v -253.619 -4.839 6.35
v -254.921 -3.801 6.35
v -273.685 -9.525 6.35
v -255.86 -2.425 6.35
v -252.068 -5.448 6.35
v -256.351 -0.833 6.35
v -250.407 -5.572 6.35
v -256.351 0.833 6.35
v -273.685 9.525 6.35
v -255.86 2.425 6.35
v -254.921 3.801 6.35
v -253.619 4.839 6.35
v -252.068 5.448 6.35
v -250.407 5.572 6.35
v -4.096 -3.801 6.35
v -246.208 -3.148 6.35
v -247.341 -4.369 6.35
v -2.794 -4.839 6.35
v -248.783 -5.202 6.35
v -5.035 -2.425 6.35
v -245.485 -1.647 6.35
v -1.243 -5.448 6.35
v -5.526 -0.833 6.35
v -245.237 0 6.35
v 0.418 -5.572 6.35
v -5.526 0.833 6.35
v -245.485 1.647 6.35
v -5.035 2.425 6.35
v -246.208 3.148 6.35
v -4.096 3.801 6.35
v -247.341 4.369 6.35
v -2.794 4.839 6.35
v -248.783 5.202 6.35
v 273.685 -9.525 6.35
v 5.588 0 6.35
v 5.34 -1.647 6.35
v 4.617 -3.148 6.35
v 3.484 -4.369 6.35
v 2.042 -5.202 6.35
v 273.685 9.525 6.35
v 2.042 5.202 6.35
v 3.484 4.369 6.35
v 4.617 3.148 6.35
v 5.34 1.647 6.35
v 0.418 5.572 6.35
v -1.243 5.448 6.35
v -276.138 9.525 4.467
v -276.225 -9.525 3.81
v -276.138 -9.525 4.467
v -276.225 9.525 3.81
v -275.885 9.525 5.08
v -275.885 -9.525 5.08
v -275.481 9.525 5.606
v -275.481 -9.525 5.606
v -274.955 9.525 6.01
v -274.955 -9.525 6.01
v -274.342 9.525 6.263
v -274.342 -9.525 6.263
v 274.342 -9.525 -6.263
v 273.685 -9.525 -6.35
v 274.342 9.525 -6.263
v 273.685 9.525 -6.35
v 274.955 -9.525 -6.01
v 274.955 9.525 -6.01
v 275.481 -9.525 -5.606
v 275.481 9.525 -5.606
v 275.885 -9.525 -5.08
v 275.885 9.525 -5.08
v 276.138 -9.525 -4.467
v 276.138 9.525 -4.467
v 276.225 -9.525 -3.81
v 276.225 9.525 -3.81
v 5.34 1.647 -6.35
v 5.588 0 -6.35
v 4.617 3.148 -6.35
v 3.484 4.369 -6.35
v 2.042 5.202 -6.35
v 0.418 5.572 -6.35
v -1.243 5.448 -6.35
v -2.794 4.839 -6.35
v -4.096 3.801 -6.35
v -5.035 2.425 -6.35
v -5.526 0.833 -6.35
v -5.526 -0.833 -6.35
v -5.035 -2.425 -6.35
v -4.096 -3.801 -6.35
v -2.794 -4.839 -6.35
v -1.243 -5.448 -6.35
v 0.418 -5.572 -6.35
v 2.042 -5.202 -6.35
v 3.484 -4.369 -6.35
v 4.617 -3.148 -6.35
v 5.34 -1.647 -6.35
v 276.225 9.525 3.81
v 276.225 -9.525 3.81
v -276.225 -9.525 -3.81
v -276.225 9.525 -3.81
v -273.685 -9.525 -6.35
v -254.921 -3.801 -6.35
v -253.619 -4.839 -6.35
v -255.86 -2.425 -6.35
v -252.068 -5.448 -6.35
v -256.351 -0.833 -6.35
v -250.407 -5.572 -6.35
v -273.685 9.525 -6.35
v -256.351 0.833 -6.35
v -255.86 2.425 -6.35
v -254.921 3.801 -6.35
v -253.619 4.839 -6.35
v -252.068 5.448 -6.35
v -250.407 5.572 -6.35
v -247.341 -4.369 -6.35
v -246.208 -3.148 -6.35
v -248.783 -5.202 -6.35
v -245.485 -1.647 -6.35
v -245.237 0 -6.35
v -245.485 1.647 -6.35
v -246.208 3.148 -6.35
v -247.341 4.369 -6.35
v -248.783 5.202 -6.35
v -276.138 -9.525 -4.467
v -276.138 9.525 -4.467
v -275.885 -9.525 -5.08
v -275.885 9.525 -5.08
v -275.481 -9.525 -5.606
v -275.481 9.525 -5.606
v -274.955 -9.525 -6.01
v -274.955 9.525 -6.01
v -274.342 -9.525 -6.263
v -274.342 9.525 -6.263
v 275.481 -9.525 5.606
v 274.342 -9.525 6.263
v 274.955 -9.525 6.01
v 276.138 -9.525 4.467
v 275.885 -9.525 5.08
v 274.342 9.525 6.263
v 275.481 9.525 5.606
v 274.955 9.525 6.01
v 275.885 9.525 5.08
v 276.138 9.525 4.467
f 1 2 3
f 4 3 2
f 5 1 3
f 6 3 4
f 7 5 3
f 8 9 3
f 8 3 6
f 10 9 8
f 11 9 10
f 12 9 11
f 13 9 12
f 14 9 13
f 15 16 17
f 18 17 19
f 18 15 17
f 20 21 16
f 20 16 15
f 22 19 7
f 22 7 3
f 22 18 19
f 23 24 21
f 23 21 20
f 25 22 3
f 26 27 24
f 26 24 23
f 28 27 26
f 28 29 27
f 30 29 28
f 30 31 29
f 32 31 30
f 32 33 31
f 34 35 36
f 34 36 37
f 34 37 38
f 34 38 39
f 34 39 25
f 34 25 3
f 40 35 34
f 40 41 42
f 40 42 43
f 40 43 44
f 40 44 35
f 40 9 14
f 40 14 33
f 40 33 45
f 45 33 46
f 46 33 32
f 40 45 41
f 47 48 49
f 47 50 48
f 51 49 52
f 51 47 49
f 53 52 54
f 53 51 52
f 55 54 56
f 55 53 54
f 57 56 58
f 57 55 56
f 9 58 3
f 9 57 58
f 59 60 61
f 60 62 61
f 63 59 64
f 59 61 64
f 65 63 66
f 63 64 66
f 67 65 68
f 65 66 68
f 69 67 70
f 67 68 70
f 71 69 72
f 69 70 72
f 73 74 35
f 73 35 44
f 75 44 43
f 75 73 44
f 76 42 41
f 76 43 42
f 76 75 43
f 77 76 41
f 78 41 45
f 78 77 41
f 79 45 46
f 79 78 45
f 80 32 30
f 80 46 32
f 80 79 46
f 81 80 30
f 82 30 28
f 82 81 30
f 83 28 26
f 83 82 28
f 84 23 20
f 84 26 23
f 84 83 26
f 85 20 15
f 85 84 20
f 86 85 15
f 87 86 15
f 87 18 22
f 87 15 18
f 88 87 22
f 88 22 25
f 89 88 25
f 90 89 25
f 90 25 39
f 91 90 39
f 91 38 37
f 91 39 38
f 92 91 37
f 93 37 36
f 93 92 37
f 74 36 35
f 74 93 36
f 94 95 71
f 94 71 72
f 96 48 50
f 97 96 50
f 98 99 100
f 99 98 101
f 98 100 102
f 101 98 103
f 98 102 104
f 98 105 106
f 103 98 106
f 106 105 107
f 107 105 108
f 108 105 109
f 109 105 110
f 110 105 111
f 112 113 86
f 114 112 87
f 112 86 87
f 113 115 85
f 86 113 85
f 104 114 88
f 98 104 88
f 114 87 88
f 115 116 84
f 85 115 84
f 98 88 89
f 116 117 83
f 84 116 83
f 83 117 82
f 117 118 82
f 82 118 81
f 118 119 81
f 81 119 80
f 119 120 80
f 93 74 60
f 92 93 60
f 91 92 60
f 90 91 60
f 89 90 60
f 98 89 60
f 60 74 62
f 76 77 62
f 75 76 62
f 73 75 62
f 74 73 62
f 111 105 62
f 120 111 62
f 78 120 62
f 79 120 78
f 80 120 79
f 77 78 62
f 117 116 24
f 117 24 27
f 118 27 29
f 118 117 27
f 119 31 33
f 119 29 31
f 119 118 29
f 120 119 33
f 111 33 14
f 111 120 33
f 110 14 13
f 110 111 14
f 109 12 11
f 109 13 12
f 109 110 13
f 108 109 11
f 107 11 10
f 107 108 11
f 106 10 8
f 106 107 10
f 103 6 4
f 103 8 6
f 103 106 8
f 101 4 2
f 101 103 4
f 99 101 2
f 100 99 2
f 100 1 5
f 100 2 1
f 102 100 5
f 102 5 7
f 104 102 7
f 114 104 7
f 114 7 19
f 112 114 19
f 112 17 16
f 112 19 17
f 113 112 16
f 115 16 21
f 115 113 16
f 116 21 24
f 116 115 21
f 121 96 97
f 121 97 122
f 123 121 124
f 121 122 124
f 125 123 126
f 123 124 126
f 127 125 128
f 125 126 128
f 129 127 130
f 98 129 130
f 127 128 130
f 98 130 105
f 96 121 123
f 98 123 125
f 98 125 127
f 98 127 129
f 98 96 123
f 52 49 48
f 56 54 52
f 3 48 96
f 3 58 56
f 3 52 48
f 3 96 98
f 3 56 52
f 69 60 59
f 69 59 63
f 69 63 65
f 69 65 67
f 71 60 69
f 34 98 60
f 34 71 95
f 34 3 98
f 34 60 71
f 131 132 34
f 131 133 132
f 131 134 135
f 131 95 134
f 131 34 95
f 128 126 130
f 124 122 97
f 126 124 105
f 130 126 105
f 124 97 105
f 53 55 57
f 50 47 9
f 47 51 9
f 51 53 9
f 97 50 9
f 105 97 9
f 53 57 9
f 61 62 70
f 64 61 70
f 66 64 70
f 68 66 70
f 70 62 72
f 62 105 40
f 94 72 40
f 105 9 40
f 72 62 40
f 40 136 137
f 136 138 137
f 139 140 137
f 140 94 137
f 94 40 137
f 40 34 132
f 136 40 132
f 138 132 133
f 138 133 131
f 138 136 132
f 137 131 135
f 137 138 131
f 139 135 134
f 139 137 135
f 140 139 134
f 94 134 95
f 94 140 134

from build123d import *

# Parameters (mm, degrees)
SKETCH1_W               = 552.45
SKETCH1_H               = 19.05
BOSS_EXTRUDE1_DEPTH     = 6.35
CUT_EXTRUDE1_DEPTH      = 277.680802099
CUT_EXTRUDE1_DEPTH_BACK = 277.680802099
SKETCH2_R               = 5.588
FILLET1_R               = 2.54


with BuildPart() as part:
    # Sketch1 → Boss-Extrude1 (new, symmetric)
    with BuildSketch(Plane.XY):
        Rectangle(SKETCH1_W, SKETCH1_H)
    extrude(amount=BOSS_EXTRUDE1_DEPTH, both=True)

    # Sketch2 → Cut-Extrude1 (cut, two sides: drawn at the far end of the back side and taken through both)
    with BuildSketch(Plane.XY.offset(6.35).offset(-CUT_EXTRUDE1_DEPTH_BACK)):
        Circle(SKETCH2_R)
        with Locations((-250.825, 0)):
            Circle(SKETCH2_R)
    extrude(amount=CUT_EXTRUDE1_DEPTH + CUT_EXTRUDE1_DEPTH_BACK, mode=Mode.SUBTRACT)

    # Fillet1
    fillet1_edges = [part.edges().sort_by_distance(p)[0] for p in [
        (-276.225, 0, 6.35),
        (276.225, 0, 6.35),
        (-276.225, 0, -6.35),
        (276.225, 0, -6.35),
    ]]
    fillet(fillet1_edges, radius=FILLET1_R)


solid = part.part
